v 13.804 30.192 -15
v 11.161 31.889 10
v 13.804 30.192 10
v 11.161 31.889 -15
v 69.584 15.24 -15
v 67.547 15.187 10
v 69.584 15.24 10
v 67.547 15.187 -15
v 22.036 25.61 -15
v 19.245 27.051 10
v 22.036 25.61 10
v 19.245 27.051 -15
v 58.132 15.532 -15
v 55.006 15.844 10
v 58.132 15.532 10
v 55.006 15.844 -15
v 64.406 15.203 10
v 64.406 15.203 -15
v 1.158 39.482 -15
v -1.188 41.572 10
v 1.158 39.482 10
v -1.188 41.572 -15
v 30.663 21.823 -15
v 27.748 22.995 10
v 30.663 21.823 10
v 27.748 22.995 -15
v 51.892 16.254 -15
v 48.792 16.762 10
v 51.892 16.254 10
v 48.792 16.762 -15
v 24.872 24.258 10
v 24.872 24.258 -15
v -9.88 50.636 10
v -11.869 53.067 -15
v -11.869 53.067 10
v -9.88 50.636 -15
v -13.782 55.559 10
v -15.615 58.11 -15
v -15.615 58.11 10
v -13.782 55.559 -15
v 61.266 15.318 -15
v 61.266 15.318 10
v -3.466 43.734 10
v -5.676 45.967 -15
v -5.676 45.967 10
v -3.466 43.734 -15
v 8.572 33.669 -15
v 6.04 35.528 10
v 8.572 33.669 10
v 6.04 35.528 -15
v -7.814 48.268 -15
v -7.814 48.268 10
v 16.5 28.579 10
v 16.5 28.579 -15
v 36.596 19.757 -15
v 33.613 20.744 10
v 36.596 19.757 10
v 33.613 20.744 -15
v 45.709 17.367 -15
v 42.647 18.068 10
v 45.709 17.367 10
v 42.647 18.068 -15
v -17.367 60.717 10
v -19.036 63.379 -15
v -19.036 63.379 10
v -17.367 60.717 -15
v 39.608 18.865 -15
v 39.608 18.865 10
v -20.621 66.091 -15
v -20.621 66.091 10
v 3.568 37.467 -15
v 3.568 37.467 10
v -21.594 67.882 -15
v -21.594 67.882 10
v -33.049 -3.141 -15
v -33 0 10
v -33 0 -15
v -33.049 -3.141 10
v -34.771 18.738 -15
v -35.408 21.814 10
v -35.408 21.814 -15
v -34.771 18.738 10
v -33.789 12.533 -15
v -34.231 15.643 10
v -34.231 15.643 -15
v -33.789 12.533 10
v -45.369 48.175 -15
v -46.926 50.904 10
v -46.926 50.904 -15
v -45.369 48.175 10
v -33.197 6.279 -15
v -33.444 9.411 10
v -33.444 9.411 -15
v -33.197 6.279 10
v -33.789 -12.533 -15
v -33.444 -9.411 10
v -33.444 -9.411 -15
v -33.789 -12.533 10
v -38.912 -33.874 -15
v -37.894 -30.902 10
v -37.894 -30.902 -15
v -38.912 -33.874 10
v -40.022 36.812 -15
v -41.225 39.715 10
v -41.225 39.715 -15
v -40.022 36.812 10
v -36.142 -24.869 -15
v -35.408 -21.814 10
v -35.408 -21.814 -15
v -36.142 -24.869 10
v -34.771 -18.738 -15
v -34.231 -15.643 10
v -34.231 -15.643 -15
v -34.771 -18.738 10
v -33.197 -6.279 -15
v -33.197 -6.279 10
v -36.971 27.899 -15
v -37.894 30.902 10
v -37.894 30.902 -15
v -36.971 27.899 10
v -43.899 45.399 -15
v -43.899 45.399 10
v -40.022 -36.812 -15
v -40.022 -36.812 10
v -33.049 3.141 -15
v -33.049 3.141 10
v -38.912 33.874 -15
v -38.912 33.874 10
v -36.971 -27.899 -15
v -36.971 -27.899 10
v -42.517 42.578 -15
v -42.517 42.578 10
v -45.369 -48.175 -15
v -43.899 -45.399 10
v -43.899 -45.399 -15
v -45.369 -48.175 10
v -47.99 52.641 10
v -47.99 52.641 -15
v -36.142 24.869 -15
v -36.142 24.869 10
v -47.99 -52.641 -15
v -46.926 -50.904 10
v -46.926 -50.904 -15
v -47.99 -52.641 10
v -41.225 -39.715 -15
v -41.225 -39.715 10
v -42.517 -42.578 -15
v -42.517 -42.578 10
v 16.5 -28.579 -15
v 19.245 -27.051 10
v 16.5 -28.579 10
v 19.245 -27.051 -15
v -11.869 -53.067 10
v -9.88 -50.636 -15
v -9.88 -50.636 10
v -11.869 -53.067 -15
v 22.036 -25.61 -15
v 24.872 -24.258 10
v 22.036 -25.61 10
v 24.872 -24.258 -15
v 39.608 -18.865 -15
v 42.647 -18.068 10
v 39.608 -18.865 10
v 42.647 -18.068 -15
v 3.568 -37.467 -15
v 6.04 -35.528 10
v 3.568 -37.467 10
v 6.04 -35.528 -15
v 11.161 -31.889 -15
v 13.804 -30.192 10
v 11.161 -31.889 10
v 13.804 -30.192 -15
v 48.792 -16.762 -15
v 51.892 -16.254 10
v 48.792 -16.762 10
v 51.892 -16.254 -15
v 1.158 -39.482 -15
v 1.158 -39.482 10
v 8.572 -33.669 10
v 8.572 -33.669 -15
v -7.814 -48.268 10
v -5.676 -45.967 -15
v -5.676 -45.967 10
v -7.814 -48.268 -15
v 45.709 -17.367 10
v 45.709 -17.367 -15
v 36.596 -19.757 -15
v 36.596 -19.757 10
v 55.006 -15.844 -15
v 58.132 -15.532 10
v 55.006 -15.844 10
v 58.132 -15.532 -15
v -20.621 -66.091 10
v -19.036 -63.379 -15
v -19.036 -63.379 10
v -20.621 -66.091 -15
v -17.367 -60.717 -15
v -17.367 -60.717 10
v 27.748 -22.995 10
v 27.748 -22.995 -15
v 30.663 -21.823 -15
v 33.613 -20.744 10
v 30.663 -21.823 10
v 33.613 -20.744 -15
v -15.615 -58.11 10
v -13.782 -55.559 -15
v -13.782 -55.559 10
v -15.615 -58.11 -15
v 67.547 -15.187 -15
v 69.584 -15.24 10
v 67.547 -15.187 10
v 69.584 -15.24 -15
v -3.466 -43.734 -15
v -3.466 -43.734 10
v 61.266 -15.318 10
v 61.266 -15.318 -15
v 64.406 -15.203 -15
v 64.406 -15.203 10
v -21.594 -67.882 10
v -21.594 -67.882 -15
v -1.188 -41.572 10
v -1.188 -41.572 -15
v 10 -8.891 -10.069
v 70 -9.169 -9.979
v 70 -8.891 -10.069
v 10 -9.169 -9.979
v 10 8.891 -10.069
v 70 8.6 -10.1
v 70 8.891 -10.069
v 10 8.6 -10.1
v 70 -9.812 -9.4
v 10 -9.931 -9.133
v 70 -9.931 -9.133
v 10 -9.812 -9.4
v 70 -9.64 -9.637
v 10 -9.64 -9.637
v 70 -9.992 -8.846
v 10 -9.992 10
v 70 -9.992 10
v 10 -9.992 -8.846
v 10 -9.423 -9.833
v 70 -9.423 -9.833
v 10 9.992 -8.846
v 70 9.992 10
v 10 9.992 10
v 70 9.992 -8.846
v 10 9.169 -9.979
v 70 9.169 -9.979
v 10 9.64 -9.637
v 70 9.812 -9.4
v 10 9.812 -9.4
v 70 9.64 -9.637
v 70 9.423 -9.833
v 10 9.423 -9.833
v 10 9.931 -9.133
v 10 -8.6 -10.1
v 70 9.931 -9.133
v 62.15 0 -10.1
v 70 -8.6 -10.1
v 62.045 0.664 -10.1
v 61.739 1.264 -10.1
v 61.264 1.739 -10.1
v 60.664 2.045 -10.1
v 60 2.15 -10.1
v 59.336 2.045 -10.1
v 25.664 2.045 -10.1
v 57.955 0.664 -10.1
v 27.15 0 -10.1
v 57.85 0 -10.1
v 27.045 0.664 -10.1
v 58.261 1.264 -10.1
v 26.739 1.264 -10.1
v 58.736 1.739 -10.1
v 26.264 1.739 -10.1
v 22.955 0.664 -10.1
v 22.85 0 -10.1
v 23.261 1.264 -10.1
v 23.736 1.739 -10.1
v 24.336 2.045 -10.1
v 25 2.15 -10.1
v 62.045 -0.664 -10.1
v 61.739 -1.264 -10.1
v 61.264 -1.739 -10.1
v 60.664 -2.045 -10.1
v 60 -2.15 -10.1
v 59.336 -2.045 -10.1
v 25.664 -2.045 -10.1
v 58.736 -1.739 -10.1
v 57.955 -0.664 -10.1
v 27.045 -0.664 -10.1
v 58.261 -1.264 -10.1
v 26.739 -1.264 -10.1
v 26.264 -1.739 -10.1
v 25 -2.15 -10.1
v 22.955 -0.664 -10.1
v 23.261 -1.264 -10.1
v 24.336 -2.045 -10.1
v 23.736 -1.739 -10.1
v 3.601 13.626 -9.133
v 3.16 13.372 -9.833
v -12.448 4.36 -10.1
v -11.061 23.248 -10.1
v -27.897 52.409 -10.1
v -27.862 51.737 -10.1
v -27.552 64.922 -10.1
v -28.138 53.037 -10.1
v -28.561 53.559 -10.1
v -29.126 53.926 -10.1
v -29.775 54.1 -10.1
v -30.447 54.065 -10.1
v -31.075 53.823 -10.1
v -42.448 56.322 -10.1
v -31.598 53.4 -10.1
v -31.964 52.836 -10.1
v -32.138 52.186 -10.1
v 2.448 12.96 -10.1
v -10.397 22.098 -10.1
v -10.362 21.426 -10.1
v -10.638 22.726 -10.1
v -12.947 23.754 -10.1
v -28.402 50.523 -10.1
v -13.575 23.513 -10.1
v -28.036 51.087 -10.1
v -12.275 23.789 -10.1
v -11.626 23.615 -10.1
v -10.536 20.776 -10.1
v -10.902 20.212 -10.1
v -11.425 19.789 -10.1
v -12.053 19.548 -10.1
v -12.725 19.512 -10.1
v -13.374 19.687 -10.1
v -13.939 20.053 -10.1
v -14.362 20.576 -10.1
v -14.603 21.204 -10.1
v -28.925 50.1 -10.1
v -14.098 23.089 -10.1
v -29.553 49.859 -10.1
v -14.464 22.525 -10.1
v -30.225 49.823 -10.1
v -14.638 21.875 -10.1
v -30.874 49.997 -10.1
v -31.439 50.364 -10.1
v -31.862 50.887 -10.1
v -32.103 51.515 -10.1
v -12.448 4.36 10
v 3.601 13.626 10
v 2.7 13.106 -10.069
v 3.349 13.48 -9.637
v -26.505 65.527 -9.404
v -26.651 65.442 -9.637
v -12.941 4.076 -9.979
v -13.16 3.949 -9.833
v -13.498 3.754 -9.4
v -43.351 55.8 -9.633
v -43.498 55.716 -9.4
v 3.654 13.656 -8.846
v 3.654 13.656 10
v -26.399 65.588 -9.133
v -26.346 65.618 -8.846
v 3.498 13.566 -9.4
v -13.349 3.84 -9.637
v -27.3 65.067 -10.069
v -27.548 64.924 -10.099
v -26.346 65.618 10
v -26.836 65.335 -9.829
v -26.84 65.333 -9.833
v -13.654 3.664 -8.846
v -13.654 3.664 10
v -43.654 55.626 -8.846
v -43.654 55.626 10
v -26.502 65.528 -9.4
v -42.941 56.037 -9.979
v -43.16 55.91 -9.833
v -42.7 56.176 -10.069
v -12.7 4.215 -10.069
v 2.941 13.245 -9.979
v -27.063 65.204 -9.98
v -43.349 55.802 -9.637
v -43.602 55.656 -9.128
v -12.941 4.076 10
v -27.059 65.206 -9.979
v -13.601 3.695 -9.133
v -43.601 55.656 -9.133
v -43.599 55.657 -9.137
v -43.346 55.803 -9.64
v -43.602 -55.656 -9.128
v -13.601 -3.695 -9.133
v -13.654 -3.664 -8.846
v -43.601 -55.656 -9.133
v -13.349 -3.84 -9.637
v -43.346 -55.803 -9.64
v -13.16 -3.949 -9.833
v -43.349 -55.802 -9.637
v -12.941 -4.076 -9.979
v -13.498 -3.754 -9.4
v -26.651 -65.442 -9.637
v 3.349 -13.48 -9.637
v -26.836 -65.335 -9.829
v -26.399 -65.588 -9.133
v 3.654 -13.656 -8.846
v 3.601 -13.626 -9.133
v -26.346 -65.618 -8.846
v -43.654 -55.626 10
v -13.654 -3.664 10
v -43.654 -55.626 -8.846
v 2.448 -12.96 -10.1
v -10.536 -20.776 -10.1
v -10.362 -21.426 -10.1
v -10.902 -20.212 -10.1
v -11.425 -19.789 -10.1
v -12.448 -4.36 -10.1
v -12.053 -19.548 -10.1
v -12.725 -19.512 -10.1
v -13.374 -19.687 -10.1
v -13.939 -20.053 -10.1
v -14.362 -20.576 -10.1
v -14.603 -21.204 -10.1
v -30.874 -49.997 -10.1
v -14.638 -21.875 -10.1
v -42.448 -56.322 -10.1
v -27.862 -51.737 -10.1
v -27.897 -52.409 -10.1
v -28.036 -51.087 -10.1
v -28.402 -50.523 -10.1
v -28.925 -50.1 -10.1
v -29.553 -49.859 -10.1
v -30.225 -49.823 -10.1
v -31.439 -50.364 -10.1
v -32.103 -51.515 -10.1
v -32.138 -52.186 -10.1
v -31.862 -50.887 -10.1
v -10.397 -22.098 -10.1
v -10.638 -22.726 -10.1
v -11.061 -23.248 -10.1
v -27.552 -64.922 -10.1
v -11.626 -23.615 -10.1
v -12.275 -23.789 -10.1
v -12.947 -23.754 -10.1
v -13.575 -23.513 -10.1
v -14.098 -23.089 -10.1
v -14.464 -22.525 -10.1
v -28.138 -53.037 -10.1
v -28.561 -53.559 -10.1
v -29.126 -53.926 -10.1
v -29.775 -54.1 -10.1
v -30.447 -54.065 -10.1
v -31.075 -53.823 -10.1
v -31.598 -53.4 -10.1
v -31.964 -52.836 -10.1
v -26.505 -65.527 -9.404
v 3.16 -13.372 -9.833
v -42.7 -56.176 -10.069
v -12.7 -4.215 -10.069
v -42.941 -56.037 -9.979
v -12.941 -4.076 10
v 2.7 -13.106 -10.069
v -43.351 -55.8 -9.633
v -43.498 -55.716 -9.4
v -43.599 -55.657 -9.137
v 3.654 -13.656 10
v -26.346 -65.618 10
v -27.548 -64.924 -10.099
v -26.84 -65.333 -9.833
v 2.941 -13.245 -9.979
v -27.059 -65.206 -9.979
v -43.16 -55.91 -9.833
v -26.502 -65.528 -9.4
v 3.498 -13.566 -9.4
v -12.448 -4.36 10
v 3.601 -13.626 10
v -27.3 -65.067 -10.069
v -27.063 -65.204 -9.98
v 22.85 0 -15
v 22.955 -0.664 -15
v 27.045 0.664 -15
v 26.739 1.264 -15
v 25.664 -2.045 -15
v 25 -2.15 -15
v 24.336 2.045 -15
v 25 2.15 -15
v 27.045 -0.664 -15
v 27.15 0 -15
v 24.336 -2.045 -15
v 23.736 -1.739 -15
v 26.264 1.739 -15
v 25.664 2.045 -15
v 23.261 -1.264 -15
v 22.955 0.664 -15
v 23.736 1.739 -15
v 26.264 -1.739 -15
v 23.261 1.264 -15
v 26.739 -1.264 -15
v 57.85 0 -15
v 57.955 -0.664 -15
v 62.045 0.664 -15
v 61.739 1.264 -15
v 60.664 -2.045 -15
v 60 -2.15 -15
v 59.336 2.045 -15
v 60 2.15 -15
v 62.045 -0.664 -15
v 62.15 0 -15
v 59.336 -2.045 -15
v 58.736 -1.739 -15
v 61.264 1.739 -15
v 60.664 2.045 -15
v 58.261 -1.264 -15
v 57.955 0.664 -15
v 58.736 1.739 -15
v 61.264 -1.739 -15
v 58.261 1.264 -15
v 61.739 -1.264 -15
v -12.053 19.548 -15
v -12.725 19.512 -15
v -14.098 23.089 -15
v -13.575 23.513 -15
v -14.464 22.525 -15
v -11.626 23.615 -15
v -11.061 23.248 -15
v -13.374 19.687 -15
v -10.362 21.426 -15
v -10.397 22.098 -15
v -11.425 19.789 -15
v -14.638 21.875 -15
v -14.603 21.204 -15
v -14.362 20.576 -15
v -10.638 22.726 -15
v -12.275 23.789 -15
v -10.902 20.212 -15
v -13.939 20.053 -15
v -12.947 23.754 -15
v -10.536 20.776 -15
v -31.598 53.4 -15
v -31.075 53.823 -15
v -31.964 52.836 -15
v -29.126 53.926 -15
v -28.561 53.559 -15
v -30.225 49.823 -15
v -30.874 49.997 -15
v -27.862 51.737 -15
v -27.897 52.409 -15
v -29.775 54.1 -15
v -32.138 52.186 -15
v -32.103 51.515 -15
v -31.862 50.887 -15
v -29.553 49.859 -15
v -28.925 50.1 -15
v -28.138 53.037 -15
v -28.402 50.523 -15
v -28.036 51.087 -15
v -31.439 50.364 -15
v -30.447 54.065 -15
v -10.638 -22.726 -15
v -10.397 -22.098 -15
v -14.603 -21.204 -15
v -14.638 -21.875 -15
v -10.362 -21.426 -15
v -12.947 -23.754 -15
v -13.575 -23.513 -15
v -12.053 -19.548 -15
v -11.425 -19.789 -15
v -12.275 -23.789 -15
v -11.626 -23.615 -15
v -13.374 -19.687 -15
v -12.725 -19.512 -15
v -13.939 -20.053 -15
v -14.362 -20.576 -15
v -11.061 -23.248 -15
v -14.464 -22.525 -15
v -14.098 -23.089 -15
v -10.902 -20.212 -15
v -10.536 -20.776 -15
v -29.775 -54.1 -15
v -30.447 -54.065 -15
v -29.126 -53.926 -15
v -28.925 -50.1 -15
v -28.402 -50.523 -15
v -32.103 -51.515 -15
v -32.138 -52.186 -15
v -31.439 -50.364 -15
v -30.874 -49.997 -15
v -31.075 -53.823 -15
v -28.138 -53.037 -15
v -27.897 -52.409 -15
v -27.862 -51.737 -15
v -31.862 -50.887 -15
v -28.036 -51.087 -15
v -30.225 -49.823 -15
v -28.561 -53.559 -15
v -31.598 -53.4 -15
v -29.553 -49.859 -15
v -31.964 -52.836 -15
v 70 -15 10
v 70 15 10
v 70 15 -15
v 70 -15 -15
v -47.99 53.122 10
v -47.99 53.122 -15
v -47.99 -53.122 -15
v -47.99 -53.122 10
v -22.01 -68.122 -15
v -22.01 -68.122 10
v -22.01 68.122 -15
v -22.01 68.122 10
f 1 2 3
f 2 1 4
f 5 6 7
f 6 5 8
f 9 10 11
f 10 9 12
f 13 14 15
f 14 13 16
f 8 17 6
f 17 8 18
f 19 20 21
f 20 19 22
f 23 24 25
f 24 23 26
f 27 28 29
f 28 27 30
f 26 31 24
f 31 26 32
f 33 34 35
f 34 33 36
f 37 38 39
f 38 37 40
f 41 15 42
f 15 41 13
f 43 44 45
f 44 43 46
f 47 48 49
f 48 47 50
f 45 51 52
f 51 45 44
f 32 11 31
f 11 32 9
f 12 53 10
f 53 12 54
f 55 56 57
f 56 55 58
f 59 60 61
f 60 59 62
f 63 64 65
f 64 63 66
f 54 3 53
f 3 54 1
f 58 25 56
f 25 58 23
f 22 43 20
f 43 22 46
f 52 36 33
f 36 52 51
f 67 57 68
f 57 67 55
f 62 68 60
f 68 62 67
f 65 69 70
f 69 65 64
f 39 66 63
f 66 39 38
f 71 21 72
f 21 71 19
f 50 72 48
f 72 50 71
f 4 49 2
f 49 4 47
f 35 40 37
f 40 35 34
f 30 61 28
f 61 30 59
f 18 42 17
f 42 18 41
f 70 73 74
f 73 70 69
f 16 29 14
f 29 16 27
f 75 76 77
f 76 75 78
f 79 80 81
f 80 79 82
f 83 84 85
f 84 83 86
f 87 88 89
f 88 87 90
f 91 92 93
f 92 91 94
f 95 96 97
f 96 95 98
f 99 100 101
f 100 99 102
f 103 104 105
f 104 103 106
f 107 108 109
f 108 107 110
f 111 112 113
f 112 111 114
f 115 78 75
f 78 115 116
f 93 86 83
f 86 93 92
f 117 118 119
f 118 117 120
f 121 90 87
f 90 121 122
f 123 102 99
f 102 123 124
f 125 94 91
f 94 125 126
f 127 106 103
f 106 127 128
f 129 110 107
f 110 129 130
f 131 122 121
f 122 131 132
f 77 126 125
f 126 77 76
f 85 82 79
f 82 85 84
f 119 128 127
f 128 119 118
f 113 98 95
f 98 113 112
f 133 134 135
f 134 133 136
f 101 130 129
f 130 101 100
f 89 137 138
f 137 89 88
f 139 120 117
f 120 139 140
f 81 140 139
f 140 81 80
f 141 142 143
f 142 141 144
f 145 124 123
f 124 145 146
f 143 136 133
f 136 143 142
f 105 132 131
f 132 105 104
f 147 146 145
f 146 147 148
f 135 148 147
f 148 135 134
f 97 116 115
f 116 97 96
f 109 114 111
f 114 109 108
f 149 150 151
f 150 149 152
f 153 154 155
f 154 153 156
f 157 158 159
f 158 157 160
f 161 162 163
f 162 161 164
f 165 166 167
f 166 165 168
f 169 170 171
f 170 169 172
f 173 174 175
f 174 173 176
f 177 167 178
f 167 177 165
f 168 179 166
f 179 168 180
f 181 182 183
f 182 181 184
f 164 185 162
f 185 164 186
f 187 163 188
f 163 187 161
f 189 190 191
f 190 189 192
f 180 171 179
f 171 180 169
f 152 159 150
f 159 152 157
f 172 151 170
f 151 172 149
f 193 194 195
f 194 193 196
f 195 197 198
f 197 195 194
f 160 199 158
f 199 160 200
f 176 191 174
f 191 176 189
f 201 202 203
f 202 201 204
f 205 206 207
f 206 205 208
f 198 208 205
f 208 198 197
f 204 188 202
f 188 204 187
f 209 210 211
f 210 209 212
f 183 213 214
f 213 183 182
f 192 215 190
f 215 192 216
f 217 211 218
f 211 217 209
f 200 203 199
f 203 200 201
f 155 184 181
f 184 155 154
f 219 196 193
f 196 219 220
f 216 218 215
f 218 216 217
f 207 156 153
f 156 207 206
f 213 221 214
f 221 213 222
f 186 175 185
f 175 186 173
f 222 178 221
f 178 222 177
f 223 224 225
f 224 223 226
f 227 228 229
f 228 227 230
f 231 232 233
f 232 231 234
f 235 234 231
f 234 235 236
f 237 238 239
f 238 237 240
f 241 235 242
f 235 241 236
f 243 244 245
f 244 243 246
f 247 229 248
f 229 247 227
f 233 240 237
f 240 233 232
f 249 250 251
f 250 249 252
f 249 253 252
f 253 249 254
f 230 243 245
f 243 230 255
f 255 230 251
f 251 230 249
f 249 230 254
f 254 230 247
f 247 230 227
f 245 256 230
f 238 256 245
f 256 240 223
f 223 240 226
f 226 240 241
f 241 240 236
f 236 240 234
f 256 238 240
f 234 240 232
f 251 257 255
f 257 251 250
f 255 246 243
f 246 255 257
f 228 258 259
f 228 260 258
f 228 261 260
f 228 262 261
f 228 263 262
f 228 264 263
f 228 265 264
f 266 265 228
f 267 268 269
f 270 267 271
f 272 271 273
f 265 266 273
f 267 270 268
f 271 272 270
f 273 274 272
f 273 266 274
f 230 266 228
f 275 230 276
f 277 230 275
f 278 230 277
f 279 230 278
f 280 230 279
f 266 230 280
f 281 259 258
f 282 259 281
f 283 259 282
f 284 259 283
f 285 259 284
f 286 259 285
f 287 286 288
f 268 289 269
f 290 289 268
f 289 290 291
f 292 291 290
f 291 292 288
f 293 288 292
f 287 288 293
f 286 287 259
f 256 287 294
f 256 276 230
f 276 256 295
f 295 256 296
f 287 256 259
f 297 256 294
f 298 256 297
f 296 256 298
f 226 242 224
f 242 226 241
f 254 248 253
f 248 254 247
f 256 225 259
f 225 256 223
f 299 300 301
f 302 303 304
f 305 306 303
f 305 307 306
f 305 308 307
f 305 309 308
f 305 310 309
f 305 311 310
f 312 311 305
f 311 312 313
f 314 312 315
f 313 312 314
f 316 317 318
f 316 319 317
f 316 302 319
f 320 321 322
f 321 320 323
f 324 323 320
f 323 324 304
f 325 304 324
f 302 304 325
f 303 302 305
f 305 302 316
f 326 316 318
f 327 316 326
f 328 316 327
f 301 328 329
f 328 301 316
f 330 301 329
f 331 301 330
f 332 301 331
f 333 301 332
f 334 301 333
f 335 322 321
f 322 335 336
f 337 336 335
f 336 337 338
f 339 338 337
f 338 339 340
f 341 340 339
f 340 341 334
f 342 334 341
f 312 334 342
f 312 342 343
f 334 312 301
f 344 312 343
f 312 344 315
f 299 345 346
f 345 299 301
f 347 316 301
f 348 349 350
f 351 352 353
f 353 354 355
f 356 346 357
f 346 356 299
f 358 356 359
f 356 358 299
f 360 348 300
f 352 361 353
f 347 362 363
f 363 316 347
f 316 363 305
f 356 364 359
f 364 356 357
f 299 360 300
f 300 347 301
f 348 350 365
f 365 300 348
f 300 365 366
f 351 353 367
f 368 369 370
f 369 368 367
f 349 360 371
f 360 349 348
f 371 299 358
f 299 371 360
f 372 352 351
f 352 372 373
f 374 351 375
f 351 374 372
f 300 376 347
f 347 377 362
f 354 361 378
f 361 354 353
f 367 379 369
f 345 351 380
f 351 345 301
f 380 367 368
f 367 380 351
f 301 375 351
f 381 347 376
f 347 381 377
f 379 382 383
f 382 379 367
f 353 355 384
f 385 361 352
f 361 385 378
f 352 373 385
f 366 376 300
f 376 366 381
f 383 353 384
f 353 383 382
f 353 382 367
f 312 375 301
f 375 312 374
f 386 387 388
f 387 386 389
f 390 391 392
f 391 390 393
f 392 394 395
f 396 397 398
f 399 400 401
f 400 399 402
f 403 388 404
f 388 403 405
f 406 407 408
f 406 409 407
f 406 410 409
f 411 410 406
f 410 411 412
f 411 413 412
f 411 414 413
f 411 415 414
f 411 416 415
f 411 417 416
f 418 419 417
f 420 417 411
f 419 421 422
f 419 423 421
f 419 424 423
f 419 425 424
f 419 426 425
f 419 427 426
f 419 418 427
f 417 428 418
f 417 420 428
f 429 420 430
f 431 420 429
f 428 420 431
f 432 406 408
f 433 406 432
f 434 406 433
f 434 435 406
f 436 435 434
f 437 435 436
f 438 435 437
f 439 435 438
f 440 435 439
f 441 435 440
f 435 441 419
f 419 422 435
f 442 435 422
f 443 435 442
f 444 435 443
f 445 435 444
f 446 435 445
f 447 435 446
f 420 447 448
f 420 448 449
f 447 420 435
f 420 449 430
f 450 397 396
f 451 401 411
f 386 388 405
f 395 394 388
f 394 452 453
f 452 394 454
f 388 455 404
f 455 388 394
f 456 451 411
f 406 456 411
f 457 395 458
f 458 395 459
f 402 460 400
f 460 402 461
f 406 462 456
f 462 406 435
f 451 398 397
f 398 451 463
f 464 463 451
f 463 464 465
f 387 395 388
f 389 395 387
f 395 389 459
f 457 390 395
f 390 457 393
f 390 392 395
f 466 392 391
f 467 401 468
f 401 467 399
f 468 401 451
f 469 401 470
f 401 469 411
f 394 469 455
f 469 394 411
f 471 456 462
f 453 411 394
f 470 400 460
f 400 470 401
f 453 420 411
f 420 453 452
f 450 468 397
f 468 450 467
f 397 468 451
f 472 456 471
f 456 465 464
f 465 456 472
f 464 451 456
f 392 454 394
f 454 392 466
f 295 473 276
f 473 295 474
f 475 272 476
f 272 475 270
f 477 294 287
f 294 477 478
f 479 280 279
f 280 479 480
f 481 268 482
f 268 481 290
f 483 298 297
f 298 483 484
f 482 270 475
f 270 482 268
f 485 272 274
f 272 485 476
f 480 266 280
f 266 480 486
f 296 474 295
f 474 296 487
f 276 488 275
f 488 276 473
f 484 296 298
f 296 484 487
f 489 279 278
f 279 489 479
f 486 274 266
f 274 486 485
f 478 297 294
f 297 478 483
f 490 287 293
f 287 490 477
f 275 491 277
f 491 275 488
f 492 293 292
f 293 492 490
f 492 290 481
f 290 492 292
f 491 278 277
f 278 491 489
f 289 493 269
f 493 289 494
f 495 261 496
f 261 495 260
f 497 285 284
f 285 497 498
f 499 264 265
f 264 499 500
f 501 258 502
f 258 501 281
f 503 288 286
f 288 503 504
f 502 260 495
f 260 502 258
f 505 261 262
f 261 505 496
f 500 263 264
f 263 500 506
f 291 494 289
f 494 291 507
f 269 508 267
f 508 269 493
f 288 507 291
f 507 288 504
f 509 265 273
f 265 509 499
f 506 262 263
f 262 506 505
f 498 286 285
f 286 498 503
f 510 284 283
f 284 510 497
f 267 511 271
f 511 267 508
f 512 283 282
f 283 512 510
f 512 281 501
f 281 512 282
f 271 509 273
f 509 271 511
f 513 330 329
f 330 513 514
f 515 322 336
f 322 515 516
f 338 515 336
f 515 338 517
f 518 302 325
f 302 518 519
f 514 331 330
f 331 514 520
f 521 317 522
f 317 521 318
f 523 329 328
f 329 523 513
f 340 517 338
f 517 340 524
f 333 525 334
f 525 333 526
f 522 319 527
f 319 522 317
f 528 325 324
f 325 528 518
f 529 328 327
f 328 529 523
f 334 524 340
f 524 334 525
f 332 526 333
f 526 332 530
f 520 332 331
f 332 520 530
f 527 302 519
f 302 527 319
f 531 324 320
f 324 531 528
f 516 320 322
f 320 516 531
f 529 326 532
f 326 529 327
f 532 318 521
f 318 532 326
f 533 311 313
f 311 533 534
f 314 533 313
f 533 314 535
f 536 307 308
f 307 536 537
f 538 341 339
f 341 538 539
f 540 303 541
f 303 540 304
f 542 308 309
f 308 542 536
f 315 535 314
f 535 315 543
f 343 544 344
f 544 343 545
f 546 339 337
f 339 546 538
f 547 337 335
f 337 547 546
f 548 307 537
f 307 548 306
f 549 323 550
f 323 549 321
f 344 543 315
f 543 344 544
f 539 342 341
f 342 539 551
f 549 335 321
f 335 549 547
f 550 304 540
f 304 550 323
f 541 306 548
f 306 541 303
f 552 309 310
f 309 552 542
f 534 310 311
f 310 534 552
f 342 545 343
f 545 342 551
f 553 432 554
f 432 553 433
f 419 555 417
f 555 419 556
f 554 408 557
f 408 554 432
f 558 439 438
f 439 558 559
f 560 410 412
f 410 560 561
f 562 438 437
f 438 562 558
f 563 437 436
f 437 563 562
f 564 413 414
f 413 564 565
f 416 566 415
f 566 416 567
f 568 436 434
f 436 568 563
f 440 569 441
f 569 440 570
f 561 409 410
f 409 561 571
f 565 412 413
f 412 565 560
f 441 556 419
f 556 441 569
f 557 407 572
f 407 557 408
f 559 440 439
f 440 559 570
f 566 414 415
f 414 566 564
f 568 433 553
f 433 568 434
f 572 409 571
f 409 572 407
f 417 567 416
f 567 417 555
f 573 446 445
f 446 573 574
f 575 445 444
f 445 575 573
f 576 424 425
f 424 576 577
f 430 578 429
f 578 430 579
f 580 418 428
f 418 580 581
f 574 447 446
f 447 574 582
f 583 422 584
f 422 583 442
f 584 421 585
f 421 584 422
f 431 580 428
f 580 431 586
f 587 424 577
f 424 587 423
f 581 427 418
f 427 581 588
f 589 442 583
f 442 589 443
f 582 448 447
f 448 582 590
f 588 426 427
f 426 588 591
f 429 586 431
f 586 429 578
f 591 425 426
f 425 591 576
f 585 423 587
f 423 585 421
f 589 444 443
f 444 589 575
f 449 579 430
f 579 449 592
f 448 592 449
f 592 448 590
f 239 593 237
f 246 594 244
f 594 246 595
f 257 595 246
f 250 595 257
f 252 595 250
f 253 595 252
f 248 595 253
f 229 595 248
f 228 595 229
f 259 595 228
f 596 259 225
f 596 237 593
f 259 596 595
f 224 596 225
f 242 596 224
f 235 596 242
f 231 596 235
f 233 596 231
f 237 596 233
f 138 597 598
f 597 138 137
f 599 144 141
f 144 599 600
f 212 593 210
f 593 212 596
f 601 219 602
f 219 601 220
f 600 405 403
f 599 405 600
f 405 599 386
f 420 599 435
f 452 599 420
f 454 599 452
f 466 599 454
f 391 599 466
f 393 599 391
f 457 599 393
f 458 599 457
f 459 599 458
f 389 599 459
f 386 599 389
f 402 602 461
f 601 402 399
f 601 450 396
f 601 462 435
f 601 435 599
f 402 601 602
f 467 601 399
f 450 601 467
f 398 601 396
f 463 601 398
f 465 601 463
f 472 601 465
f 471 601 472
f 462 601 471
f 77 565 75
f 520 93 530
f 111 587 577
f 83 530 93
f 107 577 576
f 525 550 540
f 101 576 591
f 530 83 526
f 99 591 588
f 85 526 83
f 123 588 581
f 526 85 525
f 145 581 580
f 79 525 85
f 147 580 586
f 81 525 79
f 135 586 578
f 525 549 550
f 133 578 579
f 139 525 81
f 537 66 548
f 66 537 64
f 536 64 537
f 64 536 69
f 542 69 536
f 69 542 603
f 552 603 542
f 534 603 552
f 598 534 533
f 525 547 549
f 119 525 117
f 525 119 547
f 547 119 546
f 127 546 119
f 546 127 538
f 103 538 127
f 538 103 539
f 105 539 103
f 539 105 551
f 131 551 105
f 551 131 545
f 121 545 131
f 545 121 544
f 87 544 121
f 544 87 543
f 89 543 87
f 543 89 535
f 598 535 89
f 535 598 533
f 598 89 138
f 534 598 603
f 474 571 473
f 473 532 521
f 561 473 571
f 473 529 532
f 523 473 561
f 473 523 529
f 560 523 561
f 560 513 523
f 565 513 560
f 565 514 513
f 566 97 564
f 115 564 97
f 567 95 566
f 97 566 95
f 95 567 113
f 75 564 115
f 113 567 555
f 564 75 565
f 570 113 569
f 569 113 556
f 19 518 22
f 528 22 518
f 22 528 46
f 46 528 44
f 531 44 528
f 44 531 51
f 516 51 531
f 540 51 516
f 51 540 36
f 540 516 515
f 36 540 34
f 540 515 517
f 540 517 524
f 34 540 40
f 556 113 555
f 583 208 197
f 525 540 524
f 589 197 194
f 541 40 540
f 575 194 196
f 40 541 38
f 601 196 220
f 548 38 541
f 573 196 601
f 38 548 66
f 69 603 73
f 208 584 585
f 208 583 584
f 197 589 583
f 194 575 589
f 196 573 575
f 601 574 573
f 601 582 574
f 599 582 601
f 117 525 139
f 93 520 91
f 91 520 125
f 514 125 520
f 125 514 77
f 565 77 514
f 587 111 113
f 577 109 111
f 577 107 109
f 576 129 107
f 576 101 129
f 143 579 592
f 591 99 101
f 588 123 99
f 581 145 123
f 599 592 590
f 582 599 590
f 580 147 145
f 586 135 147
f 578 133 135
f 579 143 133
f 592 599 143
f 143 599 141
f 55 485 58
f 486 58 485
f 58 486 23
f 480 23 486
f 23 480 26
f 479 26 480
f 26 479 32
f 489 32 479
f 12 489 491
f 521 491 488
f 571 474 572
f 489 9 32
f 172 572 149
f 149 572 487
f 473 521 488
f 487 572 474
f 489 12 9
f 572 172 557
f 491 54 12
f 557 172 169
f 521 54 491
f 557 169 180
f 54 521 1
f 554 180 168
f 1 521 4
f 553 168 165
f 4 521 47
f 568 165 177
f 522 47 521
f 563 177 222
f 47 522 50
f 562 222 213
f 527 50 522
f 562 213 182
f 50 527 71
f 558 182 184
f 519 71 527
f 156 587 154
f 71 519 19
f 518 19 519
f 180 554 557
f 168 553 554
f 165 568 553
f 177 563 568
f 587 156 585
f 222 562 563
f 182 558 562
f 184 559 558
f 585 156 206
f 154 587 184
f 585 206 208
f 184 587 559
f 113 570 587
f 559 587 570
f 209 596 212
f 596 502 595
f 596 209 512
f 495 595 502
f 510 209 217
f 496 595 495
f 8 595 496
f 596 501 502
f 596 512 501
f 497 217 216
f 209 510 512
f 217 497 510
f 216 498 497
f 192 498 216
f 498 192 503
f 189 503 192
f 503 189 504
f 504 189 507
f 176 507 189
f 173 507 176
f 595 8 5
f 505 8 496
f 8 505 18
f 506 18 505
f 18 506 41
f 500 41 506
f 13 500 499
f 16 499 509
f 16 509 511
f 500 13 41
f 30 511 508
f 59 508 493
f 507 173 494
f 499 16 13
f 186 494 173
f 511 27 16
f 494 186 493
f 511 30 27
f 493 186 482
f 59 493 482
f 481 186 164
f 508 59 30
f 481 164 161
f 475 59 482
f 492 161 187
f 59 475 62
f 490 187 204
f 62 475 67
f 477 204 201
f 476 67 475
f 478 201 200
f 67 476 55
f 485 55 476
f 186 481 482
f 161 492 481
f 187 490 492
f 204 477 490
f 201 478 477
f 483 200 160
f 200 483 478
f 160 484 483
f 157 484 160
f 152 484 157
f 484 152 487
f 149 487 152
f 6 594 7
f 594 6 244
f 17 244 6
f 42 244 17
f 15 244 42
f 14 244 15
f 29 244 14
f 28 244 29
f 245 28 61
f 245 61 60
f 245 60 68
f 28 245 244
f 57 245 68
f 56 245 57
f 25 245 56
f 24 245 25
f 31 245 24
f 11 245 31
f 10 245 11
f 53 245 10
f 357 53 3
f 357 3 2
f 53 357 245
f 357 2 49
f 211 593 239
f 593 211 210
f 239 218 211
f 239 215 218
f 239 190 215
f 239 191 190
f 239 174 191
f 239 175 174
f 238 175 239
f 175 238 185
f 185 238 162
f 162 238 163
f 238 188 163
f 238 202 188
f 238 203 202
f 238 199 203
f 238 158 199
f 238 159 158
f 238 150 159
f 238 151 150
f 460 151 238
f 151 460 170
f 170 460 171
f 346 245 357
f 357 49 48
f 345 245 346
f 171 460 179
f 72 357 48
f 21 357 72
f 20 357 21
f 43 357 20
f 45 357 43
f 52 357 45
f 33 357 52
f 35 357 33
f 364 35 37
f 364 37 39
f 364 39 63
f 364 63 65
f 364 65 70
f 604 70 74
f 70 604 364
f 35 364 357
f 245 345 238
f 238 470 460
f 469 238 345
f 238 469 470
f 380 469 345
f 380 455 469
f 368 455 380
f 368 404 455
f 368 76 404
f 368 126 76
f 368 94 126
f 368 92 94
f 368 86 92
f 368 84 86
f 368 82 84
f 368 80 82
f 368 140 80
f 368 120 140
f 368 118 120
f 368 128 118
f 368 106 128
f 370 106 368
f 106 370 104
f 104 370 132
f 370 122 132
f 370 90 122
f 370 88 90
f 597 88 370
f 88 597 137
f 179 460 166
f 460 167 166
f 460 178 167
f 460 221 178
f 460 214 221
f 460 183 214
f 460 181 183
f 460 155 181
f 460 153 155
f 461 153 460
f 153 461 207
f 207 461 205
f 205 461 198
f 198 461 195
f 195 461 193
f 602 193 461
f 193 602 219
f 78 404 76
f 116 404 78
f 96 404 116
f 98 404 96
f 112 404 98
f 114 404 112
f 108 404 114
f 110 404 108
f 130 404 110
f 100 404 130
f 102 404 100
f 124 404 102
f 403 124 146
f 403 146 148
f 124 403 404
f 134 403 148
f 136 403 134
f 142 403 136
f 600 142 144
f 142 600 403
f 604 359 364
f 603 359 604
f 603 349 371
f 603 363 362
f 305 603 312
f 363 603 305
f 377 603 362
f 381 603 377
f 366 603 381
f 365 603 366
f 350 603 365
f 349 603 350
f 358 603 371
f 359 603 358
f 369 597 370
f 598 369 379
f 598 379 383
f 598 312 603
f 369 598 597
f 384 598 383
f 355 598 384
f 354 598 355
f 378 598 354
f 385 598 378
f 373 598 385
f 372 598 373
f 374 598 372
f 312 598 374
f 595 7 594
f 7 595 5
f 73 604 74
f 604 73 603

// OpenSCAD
// file: configuration.scad
// OD = outside diameter, corner to corner.
m3_nut_od = 6.1;
m3_nut_radius = (m3_nut_od+0.2)/2;

m4_nut_od = 8.1;
m4_nut_radius = (m4_nut_od+0.2)/2;

// Major diameter of metric 3mm thread.
m3_major = 2.85;
m3_radius = m3_major/2;
m3_open_radius = 3.2/2;

m4_major = 3.85;
m4_radius = m4_major/2;
m4_open_radius = 4.3/2;

m5_major = 4.85;
m5_radius = m5_major/2;
m5_open_radius = 5.3/2;

m8_major = 7.85;
m8_radius = m8_major/2;
m8_open_radius = 8.3/2;

// NEMA17 stepper motors.
motor_shaft_diameter = 5;
motor_shaft_radius = (motor_shaft_diameter+0.3)/2;

// Frame brackets.
thickness = 3.6;

tower_radius = 185;
tower_side = tower_radius*1.73205;
tower_h = tower_radius*1.5;
tower_height = 1000;
bearing_spacing = 39.8;
horizontal_beam_radius = (tower_radius+28.8)/2;
horizontal_beam_length = horizontal_beam_radius * 3.464101615138 - (41.35*2);

color_a = "GreenYellow";
color_b = "black";
color_c = "";
color_d = "Silver";
// file: ../components/2020.scad
module outer_shape(h=10){
	hull(){
		translate([8.6,8.6,-h/2]) cylinder(r=1.4,h=h,$fn=30);
		translate([8.6,-8.6,-h/2]) cylinder(r=1.4,h=h,$fn=30);
		translate([-8.6,8.6,-h/2]) cylinder(r=1.4,h=h,$fn=30);
		translate([-8.6,-8.6,-h/2]) cylinder(r=1.4,h=h,$fn=30);
	}
}

module extrusion(h=10){
	difference(){
		union(){
			difference(){
				outer_shape(h=h);
				cube([17.2,17.2,h+0.1],center=true);
				cube([20.1,6,h+0.1],center=true);
				cube([6,20.1,h+0.1],center=true);

				translate([-9.9,0,0])cube([0.5,6.8,h+0.1],center=true);
				translate([9.9,0,0])cube([0.5,6.8,h+0.1],center=true);
				translate([0,-9.9,0])cube([6.8,0.5,h+0.1],center=true);
				translate([0,9.9,0])cube([6.8,0.5,h+0.1],center=true);
			}
			rotate([0,0,45]) cube([26,1.5,h],center=true);
			rotate([0,0,-45]) cube([26,1.5,h],center=true);
			intersection(){
				union(){
					translate([8,8,0]) cube([4,4,h],center=true);
					translate([8,-8,0]) cube([4,4,h],center=true);
					translate([-8,8,0]) cube([4,4,h],center=true);
					translate([-8,-8,0]) cube([4,4,h],center=true);
				}
				outer_shape();
			}
			cube([9,9,h],center=true);
		}
		translate([0,0,-h/2-1]) cylinder(h+2,2.5,2.5,$fn=30);
	}


}

module beam(h=10,clearance = 0){
	if(clearance > 0){
		outer_shape(h=h);
	} else {
		extrusion(h);
	}
}
// main file
include <../components/2020.scad>
include <configuration.scad>

module hub_beams(l=100){
	// 3 times
	for(i = [0,120,240]){	
		 rotate([0,0,i]) translate([10,0,0]) rotate([0,90,0]) translate([0,0,l/2]) beam(h=l,clearance=0);
	}
}

// the base object
module holder(l=60){
	hull(){
		for(i = [0,120,240]){	
			 rotate([0,0,i]) translate([10,0,-2.5]) rotate([0,90,0]) translate([0,0,l/2]) cube([25,30,l],center=true);
		}
	}
}

module cutouts(l=61){
	// round outside
	for(i = [60,180,300]){	
		 rotate([0,0,i]) translate([133,0,-20]) cylinder(40,100,100,$fn=200);
	}

	// the cutout for the beam
	for(i = [0,120,240]){	
		 rotate([0,0,i]) translate([10,0,-0.1]) rotate([0,90,0]) translate([0,0,l/2]) beam(h=l,clearance=1);
		 rotate([0,0,i]) translate([10,0,2]) rotate([0,90,0]) translate([0,0,l/2]) beam(h=l,clearance=1);
	}

	// holes for mounting the beam
	for(i = [0,120,240]){	
		 rotate([0,0,i]) translate([25,0,-50])cylinder(100,m4_open_radius,m4_open_radius,$fn=20);
		 rotate([0,0,i]) translate([60,0,-50])cylinder(100,m4_open_radius,m4_open_radius,$fn=20);
	}

	// centerhole for measuring or whatever
//	translate([0,0,-50]) cylinder(100,0,0,$fn=20);
}

//combine everything
module central_hub(color="red"){
	color(color)
		difference(){
			holder(l=60);
			cutouts(l=61);
		}
}

//render
central_hub();
